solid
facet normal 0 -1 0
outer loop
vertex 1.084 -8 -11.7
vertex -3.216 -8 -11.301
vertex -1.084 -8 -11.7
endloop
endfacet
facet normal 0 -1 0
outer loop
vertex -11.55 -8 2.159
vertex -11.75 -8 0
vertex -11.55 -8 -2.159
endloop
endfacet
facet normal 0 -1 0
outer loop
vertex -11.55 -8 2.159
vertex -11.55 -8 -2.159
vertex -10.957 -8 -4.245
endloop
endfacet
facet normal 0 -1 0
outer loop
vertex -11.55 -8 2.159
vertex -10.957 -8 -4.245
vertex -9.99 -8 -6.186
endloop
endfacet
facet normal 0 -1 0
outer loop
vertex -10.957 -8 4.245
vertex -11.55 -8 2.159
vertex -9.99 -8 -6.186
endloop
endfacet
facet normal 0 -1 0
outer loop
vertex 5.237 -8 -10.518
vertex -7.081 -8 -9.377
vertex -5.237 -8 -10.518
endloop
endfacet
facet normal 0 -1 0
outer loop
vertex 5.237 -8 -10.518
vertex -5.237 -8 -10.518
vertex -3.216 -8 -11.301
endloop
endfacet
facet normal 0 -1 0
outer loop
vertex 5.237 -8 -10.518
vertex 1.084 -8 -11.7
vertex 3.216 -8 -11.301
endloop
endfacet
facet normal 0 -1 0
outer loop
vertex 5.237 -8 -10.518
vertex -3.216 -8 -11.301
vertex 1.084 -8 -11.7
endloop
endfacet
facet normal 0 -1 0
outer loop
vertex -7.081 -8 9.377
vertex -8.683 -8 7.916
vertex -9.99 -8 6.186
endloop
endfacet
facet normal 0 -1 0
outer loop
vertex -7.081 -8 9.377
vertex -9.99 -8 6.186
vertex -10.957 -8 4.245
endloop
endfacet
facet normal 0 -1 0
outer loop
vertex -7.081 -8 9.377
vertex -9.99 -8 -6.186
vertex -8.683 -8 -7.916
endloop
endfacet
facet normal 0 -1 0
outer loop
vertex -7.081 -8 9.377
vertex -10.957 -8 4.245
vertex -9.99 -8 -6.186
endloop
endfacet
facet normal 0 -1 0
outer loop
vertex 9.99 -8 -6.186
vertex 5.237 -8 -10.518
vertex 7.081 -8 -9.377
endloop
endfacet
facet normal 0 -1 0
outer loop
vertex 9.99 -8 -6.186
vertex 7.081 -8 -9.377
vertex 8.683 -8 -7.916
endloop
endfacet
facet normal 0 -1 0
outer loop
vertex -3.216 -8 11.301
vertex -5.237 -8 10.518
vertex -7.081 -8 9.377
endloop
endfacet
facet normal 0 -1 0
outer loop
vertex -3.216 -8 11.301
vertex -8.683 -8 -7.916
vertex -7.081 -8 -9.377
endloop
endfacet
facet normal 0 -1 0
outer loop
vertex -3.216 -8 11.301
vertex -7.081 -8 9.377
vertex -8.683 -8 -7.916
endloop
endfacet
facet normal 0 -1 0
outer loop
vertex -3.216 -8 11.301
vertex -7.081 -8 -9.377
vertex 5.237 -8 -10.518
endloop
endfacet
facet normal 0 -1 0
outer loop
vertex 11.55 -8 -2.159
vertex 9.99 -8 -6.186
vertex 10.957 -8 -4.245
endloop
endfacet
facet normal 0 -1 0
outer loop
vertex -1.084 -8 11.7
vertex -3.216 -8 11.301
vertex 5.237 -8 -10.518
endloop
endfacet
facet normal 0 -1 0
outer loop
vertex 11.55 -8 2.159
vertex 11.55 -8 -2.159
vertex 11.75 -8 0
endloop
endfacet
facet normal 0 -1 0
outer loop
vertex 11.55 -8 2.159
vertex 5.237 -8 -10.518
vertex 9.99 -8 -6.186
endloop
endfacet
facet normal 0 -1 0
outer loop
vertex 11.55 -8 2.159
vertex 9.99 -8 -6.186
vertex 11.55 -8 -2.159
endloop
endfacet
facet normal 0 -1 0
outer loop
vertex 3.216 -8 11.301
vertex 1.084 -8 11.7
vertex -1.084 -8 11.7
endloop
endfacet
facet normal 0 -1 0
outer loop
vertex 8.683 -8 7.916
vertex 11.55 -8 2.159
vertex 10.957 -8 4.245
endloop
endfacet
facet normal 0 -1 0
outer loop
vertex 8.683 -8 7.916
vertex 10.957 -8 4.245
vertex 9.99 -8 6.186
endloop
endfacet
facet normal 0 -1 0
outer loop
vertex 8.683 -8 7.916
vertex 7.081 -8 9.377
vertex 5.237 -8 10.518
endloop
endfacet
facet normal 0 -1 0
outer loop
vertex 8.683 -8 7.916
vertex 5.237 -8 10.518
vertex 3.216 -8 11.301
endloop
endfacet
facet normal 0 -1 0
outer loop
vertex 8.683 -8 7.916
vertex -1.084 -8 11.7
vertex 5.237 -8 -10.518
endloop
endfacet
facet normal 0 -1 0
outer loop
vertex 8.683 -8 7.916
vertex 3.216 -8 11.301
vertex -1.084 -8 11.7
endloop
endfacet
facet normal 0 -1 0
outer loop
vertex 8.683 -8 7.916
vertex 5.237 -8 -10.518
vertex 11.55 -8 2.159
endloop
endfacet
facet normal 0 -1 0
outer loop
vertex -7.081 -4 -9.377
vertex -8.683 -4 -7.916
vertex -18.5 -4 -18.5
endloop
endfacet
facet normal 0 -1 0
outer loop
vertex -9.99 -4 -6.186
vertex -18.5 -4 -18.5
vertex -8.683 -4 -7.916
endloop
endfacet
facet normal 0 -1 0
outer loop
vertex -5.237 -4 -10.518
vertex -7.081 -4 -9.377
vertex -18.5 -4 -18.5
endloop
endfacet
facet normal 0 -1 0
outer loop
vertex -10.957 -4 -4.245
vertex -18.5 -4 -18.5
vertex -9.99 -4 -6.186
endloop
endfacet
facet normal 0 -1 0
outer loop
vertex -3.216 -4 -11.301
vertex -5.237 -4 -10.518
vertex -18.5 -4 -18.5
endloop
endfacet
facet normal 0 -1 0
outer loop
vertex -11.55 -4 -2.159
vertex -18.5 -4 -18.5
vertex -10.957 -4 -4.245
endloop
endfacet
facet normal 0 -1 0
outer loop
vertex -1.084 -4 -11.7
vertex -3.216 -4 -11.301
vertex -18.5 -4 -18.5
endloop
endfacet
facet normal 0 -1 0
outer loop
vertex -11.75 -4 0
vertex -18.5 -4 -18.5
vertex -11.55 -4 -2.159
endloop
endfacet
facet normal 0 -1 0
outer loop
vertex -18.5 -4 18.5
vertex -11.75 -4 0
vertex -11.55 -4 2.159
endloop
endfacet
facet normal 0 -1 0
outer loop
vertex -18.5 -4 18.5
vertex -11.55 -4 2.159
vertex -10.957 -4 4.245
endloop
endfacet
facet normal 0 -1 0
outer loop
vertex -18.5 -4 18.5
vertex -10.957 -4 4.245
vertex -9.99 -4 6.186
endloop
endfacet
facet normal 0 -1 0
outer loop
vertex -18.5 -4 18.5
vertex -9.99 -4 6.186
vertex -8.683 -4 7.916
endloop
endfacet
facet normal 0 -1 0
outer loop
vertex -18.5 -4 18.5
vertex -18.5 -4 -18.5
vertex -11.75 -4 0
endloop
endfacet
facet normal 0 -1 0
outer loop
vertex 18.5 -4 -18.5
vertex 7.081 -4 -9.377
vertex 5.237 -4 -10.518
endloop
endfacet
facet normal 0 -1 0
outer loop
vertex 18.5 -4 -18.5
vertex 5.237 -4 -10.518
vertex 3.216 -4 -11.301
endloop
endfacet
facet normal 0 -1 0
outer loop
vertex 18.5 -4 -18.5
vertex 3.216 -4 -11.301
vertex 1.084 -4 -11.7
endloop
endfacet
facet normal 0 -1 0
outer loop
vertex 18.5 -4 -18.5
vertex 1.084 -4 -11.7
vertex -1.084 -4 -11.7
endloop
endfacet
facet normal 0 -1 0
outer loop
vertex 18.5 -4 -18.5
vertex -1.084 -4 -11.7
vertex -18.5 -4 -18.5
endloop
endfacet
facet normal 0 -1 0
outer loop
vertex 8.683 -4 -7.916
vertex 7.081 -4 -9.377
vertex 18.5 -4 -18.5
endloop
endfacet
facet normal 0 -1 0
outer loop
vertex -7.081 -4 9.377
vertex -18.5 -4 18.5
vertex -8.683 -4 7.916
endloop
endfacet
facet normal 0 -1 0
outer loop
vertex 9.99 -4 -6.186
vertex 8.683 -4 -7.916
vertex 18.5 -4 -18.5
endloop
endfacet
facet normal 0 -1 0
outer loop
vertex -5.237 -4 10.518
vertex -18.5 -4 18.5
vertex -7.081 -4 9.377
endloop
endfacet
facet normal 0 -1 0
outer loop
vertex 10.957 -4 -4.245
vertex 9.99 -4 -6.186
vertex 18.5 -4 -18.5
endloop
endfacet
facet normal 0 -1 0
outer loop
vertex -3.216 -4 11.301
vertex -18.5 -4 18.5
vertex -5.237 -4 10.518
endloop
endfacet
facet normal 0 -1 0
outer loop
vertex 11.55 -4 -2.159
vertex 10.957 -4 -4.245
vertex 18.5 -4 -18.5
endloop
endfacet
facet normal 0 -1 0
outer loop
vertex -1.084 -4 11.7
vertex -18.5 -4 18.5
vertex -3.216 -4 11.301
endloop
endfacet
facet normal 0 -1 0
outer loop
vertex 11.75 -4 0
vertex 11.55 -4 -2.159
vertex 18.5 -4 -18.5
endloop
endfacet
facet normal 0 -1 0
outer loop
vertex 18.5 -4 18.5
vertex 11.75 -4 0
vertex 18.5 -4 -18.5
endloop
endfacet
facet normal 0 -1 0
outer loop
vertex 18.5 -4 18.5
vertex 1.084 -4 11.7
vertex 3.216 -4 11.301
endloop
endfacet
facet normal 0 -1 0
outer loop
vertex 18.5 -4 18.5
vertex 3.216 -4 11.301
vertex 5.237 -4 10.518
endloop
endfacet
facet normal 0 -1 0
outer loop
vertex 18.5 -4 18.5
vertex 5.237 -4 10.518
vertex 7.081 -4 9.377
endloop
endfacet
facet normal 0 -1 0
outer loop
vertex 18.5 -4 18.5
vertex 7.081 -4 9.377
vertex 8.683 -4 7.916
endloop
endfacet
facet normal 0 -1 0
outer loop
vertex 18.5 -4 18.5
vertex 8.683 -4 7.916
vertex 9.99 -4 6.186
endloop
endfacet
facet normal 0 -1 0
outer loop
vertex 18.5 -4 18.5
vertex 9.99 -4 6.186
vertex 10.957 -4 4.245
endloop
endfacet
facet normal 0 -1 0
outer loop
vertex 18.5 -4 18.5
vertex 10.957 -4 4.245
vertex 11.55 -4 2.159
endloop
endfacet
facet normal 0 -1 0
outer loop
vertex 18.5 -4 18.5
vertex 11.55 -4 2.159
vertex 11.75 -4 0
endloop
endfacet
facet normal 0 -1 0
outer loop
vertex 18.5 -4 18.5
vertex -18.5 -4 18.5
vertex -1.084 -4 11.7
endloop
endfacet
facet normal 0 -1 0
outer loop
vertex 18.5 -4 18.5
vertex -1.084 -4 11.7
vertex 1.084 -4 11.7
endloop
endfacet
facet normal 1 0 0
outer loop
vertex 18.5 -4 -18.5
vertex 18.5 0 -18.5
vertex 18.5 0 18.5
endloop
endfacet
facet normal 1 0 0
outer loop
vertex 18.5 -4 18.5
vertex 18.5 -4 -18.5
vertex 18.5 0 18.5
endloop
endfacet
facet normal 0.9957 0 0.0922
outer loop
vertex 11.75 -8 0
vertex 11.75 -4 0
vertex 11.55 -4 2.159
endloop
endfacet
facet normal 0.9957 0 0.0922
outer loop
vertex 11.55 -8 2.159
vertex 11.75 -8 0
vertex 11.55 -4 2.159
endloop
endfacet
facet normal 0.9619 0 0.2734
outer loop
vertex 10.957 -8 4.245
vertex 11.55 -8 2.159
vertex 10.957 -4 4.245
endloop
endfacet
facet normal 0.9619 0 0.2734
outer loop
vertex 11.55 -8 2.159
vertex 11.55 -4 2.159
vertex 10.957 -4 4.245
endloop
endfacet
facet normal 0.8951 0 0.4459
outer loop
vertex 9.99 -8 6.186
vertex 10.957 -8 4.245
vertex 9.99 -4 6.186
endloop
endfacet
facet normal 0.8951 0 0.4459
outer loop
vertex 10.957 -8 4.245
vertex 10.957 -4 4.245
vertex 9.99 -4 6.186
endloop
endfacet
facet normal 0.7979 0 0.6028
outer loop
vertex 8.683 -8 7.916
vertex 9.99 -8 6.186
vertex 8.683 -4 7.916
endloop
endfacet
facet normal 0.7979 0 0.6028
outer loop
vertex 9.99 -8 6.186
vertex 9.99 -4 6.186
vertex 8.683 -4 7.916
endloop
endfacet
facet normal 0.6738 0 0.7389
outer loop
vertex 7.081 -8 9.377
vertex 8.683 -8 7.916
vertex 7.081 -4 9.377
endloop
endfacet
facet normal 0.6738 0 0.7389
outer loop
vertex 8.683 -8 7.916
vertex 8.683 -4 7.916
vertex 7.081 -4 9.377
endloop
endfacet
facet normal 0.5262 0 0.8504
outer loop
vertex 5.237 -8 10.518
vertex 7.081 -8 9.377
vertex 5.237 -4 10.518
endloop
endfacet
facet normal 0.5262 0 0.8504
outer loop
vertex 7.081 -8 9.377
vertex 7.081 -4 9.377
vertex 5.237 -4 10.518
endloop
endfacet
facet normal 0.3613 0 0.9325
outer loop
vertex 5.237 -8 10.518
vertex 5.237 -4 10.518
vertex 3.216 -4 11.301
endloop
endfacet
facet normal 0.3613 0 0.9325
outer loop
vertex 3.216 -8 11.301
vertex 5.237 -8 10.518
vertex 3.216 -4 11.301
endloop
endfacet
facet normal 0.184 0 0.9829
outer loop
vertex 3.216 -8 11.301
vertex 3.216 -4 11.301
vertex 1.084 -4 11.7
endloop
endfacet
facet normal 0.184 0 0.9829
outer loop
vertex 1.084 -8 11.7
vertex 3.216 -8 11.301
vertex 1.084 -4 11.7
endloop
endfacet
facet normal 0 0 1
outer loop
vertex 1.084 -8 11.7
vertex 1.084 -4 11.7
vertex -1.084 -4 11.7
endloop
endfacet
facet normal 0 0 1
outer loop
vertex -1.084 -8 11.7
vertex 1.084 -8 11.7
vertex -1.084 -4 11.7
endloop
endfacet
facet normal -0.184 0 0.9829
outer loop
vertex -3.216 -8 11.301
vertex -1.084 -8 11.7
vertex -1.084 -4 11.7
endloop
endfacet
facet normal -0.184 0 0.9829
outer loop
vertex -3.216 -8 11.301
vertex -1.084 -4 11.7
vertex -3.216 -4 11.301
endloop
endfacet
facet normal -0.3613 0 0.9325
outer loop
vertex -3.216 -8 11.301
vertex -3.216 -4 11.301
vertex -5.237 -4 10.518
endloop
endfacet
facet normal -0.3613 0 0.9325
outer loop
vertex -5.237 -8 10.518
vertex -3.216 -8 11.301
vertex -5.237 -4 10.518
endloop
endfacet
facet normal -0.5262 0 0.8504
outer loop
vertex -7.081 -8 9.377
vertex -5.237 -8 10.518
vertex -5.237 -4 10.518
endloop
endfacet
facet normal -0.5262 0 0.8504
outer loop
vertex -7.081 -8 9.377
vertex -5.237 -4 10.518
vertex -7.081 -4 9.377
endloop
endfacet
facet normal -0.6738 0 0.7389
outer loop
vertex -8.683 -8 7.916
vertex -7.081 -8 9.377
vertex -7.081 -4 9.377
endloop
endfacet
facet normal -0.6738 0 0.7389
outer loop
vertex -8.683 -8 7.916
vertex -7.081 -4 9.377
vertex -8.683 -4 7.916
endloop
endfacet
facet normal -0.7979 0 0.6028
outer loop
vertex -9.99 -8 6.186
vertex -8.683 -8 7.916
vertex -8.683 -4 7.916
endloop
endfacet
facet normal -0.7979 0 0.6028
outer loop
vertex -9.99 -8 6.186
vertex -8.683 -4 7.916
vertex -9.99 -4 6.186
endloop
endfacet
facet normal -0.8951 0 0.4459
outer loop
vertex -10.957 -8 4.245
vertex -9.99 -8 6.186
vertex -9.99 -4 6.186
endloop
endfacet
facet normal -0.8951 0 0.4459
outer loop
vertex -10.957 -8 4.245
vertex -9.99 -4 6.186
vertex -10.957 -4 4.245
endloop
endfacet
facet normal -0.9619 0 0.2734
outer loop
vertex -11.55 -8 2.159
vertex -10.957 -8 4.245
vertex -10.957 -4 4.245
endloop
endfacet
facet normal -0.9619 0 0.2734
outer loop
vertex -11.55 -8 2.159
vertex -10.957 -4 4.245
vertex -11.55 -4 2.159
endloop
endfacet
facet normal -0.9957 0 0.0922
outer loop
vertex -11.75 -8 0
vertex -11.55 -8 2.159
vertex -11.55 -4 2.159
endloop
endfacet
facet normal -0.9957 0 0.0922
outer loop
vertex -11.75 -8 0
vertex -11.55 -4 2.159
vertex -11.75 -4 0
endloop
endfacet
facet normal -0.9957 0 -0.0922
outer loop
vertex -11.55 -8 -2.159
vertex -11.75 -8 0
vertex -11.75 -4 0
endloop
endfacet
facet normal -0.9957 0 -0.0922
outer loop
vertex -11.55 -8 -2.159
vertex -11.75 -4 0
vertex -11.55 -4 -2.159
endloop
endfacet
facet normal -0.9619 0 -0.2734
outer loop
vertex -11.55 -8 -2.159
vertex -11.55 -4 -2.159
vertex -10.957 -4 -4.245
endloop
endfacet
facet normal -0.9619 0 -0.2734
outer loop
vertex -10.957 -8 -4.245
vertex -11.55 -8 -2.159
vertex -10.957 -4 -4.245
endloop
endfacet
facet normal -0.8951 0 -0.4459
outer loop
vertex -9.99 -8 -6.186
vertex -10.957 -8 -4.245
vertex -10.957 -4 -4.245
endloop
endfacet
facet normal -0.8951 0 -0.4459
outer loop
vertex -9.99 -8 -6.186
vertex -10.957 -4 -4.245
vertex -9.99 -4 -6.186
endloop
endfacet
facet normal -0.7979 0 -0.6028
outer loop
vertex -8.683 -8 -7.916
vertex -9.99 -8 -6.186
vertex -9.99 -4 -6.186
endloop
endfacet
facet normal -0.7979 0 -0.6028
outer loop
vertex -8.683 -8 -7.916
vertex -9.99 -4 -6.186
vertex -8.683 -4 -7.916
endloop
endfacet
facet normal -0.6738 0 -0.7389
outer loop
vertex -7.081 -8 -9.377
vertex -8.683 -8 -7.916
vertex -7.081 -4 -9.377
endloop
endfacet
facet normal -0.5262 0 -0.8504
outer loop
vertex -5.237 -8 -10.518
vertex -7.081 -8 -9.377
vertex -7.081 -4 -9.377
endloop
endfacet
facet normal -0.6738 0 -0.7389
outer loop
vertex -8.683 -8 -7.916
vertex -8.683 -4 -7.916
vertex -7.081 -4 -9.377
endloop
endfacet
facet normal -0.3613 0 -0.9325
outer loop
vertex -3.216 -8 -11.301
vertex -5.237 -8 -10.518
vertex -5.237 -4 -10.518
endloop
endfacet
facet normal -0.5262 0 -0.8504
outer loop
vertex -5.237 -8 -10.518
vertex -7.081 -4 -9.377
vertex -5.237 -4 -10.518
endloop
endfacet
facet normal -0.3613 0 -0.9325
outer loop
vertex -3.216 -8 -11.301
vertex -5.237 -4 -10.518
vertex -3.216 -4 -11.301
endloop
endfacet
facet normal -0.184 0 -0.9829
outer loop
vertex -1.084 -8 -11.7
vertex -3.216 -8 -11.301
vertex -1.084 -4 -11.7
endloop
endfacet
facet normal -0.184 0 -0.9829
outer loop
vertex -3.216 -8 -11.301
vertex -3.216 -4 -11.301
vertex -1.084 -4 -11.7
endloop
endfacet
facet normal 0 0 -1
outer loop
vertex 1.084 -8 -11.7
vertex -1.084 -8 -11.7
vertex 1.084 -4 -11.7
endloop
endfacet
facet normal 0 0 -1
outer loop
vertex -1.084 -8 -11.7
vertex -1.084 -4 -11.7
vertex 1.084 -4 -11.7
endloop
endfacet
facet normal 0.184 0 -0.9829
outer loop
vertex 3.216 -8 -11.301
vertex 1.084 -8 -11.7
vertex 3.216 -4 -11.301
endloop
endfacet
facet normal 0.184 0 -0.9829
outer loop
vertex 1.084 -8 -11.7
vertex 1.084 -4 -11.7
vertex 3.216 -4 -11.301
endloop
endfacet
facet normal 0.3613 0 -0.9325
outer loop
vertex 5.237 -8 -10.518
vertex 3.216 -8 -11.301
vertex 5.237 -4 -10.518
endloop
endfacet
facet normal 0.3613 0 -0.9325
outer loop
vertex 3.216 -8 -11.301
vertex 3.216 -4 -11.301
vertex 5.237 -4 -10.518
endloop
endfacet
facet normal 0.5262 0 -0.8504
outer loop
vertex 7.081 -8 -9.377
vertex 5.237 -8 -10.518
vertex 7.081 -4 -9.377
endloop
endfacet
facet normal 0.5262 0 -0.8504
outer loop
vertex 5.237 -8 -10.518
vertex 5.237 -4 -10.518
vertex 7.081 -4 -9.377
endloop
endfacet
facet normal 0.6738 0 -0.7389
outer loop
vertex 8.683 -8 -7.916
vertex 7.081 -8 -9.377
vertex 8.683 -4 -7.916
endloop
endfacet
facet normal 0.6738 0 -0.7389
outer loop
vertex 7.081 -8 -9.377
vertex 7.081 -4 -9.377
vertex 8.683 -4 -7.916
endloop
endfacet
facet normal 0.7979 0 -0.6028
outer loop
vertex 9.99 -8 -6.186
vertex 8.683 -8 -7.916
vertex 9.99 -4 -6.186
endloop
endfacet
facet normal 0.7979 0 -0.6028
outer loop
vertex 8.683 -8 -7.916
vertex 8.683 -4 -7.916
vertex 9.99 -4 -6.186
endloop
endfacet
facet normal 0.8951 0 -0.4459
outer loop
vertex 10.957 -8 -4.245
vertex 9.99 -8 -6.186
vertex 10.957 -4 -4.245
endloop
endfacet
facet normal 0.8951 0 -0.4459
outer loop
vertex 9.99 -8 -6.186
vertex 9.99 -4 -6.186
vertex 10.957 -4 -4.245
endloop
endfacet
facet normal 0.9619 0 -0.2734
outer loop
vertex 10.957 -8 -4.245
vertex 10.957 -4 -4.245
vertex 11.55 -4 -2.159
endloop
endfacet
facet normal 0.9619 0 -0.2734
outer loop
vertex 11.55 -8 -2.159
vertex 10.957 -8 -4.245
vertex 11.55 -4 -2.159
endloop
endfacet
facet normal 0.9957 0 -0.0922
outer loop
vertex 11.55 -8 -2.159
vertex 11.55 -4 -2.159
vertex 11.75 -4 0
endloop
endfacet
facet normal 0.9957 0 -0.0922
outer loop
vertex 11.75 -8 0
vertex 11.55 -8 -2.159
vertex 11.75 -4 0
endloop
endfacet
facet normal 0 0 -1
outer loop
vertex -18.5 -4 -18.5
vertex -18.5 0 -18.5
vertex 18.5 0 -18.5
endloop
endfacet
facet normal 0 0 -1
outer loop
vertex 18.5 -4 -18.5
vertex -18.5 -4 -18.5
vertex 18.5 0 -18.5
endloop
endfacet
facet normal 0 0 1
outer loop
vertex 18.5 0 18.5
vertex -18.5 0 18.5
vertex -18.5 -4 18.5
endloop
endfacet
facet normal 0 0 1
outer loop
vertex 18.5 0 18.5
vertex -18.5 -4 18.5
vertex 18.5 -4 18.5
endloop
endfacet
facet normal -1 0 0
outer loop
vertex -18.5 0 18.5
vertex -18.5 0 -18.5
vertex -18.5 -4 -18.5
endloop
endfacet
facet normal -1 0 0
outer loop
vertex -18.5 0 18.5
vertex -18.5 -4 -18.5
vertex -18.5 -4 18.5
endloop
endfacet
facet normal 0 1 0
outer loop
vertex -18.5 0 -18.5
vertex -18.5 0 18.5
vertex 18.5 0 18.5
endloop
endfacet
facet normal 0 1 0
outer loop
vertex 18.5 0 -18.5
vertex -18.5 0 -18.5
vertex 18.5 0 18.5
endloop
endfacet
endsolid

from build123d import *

# Parameters (mm, degrees)
F0_W     = 37
F0_H     = 37
F1_DEPTH = 4
F2_R     = 11.75
F3_DEPTH = 8


with BuildPart() as f1:
    # F0 (on Front) → F1 (new body)
    with BuildSketch(Plane.XZ):
        Rectangle(F0_W, F0_H)
    extrude(amount=F1_DEPTH)

    # F2 (on Front) → F3 (join)
    with BuildSketch(Plane.XZ):
        Circle(F2_R)
    extrude(amount=F3_DEPTH)


solid = f1.part
